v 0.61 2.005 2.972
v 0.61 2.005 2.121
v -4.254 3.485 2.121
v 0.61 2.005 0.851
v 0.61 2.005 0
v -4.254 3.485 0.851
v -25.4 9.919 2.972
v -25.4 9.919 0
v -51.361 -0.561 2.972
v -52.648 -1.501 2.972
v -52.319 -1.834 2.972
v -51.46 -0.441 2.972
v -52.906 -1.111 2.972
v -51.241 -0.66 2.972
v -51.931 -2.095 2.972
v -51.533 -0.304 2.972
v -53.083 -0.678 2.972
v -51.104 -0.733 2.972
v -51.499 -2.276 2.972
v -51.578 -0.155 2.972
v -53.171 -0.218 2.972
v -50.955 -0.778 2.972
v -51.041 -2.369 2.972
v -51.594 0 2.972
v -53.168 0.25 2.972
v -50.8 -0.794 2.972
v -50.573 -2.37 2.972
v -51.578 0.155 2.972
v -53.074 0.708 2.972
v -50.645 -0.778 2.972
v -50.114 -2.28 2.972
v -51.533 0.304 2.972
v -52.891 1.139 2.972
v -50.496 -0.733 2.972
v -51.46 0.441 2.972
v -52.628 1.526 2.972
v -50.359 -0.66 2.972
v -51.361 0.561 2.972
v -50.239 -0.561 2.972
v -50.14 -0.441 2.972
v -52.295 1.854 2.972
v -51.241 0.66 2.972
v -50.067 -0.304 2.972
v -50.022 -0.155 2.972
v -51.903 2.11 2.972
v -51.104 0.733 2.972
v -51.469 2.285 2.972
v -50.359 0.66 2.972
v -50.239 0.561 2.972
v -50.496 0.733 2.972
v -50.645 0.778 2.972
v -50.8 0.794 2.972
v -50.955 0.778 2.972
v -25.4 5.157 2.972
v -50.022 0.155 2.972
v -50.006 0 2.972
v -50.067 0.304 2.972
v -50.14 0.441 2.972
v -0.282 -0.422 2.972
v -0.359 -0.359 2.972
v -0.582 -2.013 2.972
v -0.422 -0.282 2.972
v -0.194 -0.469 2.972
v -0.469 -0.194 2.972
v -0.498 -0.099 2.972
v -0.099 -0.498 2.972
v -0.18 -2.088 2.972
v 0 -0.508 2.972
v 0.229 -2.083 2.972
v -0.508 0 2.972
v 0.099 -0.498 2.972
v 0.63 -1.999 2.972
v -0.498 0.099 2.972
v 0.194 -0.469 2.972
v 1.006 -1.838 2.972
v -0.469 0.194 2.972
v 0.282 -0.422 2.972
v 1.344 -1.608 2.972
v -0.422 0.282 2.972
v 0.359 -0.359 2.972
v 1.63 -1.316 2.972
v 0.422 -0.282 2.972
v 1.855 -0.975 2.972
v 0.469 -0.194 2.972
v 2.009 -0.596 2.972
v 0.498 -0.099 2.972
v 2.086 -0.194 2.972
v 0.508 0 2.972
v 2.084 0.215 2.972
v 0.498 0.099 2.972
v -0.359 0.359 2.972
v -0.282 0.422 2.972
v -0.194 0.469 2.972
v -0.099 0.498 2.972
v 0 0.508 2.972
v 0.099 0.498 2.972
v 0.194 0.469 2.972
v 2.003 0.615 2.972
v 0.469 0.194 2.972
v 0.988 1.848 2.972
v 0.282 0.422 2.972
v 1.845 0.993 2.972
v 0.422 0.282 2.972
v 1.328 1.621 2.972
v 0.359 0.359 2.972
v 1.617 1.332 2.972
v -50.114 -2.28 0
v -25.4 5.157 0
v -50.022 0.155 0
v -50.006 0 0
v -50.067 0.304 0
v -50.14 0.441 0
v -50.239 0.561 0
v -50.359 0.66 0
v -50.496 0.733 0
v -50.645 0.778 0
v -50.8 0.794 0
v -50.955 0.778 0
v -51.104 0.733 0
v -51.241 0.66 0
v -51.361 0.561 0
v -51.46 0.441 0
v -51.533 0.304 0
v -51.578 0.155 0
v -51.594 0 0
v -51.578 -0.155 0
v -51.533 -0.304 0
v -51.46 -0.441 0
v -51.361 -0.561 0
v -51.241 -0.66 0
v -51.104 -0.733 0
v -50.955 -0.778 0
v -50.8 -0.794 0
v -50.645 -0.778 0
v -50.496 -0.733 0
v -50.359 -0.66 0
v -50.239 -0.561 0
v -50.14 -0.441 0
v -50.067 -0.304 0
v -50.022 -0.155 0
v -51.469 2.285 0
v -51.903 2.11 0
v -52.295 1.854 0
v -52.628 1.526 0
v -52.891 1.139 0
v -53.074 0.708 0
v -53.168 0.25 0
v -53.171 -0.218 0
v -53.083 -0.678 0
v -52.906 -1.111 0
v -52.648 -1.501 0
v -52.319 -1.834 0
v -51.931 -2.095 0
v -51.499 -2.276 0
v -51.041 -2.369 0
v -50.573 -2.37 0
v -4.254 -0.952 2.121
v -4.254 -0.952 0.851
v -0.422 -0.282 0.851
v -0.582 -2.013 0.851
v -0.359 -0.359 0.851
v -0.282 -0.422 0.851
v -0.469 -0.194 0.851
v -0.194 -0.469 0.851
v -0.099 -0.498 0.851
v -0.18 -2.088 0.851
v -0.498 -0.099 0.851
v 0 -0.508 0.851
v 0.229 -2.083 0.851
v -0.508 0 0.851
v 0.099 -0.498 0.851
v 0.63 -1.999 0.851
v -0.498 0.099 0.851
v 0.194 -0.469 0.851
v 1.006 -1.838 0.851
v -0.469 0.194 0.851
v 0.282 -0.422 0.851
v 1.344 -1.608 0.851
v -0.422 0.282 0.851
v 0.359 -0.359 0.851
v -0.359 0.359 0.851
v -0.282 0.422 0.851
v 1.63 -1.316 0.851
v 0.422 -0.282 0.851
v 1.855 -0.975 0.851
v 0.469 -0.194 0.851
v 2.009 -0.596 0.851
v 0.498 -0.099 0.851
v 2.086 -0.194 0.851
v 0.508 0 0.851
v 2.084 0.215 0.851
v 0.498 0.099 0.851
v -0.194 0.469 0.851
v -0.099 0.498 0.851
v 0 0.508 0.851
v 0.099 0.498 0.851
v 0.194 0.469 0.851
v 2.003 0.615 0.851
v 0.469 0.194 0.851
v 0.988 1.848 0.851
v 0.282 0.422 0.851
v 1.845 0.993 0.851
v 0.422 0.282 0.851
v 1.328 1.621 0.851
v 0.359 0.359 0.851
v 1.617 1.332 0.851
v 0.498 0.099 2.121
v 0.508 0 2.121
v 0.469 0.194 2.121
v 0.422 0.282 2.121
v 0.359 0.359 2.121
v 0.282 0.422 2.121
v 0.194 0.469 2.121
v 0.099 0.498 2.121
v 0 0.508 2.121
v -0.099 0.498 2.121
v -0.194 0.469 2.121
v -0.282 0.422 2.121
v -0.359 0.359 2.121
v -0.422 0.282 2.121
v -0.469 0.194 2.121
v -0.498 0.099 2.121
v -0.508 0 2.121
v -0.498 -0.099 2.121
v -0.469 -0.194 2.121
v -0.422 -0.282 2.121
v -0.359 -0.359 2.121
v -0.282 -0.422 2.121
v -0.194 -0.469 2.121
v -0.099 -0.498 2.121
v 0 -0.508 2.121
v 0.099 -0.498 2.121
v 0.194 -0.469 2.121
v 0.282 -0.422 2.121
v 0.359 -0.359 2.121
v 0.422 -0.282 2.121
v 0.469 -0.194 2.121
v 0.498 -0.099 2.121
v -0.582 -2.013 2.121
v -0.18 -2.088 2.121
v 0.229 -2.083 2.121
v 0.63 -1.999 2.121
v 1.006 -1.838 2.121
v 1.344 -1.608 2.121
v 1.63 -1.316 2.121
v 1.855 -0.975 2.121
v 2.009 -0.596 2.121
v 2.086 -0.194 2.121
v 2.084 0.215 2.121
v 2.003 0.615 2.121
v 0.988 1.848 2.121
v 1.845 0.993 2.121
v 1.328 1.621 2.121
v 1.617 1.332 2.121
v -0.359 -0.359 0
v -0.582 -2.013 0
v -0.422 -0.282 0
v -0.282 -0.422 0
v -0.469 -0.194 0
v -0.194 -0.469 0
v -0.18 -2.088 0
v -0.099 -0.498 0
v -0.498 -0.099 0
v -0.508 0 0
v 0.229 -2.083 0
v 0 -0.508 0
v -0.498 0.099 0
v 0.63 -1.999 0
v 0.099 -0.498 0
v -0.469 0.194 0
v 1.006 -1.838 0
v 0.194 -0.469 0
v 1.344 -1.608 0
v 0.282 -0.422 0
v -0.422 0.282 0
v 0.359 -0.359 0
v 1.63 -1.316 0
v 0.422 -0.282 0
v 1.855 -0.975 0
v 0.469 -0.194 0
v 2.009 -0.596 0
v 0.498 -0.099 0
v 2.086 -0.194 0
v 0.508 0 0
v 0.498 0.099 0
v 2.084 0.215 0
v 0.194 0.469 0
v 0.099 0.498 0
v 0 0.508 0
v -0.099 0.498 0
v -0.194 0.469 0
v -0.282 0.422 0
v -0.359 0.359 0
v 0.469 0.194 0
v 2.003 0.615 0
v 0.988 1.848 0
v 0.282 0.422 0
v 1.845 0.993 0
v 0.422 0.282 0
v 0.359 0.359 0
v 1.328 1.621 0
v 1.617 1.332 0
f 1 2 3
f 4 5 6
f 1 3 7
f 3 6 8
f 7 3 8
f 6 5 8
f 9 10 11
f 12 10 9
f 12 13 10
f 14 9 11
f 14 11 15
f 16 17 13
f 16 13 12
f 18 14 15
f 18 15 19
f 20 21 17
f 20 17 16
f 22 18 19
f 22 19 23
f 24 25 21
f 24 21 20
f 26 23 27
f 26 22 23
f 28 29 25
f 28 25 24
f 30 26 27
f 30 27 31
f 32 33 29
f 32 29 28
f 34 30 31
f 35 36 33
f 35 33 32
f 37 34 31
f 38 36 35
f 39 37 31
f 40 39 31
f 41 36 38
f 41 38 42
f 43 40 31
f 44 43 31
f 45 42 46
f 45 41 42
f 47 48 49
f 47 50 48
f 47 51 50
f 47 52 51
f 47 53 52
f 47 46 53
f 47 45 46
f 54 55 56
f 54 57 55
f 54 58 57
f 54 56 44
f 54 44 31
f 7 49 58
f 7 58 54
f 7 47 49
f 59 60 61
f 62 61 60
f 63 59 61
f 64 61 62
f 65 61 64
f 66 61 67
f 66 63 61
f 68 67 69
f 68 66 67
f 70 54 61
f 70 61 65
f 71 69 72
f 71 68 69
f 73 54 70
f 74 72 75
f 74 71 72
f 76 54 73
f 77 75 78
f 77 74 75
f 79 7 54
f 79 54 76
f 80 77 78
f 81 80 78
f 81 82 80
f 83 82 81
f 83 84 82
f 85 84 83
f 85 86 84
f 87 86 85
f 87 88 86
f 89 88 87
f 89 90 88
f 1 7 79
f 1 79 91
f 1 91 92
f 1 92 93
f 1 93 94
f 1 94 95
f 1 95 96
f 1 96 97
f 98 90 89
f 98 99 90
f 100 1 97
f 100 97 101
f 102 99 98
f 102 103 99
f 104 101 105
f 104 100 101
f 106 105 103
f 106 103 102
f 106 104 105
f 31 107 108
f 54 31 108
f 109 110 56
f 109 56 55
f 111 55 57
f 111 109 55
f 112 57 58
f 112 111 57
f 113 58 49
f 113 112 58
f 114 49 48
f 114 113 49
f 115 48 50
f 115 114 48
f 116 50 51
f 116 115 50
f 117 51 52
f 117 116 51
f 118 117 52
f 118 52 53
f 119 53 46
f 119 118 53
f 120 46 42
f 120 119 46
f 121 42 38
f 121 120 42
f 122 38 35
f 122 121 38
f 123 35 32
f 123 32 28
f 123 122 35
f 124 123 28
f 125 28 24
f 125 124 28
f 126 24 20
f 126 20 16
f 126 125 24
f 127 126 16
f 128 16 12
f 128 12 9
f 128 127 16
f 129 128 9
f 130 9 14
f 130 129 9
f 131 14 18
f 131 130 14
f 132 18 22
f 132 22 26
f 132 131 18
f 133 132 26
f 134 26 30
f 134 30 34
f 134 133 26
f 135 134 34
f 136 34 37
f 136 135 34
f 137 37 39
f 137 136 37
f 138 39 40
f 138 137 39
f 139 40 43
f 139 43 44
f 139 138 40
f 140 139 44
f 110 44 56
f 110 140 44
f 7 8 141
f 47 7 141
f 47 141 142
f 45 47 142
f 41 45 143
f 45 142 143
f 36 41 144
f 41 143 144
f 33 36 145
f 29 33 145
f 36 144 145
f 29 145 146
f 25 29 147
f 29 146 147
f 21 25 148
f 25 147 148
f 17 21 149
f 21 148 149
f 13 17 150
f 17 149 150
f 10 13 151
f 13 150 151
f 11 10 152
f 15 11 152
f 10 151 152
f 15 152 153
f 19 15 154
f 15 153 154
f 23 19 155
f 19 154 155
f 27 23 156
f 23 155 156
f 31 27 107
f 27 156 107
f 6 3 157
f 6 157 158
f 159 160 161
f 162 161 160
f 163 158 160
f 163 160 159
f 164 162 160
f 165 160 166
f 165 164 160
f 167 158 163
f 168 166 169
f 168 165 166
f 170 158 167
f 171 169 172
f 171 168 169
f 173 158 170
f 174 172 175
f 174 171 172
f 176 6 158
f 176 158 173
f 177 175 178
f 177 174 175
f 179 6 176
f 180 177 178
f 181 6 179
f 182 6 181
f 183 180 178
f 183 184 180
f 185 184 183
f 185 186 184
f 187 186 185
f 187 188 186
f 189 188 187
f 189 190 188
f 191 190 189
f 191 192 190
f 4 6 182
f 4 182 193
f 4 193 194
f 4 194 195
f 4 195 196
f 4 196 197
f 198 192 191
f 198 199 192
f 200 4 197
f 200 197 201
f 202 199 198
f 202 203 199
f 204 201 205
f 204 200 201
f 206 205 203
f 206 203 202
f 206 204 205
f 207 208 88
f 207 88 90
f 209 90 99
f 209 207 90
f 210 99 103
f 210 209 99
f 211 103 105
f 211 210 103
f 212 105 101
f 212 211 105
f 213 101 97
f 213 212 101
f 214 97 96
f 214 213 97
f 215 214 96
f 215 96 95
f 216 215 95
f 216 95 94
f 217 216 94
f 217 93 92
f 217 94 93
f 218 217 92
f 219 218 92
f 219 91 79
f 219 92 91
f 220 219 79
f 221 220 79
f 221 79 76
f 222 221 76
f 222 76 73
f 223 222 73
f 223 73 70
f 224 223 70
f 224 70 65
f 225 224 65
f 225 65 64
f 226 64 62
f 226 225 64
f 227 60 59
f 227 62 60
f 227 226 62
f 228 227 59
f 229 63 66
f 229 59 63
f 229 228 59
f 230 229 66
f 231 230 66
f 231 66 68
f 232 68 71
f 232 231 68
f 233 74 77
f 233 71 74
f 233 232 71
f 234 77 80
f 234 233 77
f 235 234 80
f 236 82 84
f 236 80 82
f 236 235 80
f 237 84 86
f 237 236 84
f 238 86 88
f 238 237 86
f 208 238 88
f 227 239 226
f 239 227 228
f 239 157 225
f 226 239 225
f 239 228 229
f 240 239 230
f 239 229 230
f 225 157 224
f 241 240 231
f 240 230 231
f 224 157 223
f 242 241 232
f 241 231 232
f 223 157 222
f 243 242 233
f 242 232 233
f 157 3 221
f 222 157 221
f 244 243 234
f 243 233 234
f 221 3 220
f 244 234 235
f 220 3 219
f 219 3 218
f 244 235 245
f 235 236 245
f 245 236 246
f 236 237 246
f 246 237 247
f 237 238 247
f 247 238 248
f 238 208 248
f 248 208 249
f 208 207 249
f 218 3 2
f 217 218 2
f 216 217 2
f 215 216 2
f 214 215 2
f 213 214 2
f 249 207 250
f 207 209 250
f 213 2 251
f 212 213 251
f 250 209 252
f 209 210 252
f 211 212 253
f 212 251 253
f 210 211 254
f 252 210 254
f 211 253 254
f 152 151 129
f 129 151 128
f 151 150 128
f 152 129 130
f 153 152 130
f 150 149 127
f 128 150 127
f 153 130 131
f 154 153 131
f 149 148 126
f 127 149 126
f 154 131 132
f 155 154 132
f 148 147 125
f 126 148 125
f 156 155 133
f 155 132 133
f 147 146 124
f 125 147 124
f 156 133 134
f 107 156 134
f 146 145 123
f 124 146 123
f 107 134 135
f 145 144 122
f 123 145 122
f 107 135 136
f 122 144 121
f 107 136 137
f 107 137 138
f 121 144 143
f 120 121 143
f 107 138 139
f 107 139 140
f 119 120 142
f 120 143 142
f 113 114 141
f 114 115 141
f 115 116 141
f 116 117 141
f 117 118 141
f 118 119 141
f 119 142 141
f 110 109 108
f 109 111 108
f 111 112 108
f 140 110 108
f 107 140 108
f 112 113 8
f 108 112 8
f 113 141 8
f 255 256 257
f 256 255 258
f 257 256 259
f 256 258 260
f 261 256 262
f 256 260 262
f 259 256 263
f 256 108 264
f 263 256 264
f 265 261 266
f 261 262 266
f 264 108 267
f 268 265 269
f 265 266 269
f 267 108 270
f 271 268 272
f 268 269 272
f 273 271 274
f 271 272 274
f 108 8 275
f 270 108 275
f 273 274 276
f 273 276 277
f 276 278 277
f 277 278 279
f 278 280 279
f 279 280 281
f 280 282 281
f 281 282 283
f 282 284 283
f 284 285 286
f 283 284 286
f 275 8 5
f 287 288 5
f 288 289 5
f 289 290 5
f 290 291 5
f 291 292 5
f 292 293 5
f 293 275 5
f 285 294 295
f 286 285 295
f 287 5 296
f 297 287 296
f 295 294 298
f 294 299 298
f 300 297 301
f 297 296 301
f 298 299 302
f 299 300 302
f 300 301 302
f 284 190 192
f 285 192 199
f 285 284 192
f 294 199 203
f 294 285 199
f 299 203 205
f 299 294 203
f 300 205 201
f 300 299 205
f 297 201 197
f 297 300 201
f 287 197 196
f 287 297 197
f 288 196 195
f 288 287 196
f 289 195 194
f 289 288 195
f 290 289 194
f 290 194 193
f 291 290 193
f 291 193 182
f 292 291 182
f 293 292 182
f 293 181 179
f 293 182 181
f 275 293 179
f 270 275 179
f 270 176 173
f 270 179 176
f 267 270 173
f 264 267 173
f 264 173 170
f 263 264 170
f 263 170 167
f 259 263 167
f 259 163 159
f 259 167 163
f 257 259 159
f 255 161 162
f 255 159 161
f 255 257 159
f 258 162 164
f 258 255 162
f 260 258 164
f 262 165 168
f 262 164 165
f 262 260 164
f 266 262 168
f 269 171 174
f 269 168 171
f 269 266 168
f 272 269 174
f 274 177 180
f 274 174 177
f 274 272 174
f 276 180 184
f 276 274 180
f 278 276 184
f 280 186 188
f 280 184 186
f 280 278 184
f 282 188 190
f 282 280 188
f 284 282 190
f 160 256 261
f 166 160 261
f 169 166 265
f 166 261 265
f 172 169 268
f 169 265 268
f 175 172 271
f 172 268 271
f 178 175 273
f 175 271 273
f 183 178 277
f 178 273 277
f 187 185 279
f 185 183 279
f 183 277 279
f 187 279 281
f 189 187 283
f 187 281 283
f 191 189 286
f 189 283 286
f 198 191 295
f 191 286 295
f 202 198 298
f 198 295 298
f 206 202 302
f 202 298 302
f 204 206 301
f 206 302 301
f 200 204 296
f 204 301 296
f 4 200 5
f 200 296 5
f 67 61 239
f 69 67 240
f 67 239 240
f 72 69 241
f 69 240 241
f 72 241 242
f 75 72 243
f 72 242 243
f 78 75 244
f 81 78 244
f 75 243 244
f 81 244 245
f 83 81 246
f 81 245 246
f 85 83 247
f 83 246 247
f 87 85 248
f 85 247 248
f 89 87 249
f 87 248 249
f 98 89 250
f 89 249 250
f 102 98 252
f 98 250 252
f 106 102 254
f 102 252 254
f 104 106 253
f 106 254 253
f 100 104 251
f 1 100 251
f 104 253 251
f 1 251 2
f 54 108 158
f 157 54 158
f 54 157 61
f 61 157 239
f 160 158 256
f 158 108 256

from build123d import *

# Parameters (mm, degrees)
SKETCH1_R               = 0.79375
BOSS_EXTRUDE1_DEPTH     = 2.9718
SKETCH2_W               = 8.538559206
SKETCH2_H               = 1.27
CUT_EXTRUDE1_DEPTH      = 10.919149519
CUT_EXTRUDE1_DEPTH_BACK = 3.38125
SKETCH1_4_R             = 0.508
CUT_EXTRUDE3_DEPTH      = 3.9718
CUT_EXTRUDE3_DEPTH_BACK = 1


with BuildPart() as part:
    # Sketch1 → Boss-Extrude1 (new body)
    with BuildSketch(Plane.XY):
        with BuildLine():
            Line((-50.113827643, -2.280245394), (-25.4, 5.156649519))
            Line((-25.4, 5.156649519), (-0.581588952, -2.013175239))
            ThreePointArc((-0.581588952, -2.013175239), (2.009011043, -0.595814467), (0.610010171, 2.004746329))
            Line((0.610010171, 2.004746329), (-25.4, 9.919149519))
            Line((-25.4, 9.919149519), (-51.469201485, 2.285283557))
            ThreePointArc((-51.469201485, 2.285283557), (-53.082780246, -0.677691603), (-50.113827643, -2.280245394))
        make_face()
        with Locations((-50.8, 0)):
            Circle(SKETCH1_R, mode=Mode.SUBTRACT)
    extrude(amount=BOSS_EXTRUDE1_DEPTH)

    # Sketch2 → Cut-Extrude1 (cut, two sides)
    with BuildSketch(Plane(origin=(0, 0, 0), x_dir=(1, 0, 0), z_dir=(0, 1, 0))) as cut_extrude1_sk:
        with Locations((0.014779603, -1.4859)):
            Rectangle(SKETCH2_W, SKETCH2_H)
    extrude(amount=CUT_EXTRUDE1_DEPTH, mode=Mode.SUBTRACT)
    extrude(cut_extrude1_sk.sketch, amount=-CUT_EXTRUDE1_DEPTH_BACK, mode=Mode.SUBTRACT)

    # Sketch1<4> → Cut-Extrude3 (cut, two sides)
    with BuildSketch(Plane.XY) as cut_extrude3_sk:
        Circle(SKETCH1_4_R)
    extrude(amount=CUT_EXTRUDE3_DEPTH, mode=Mode.SUBTRACT)
    extrude(cut_extrude3_sk.sketch, amount=-CUT_EXTRUDE3_DEPTH_BACK, mode=Mode.SUBTRACT)


solid = part.part
